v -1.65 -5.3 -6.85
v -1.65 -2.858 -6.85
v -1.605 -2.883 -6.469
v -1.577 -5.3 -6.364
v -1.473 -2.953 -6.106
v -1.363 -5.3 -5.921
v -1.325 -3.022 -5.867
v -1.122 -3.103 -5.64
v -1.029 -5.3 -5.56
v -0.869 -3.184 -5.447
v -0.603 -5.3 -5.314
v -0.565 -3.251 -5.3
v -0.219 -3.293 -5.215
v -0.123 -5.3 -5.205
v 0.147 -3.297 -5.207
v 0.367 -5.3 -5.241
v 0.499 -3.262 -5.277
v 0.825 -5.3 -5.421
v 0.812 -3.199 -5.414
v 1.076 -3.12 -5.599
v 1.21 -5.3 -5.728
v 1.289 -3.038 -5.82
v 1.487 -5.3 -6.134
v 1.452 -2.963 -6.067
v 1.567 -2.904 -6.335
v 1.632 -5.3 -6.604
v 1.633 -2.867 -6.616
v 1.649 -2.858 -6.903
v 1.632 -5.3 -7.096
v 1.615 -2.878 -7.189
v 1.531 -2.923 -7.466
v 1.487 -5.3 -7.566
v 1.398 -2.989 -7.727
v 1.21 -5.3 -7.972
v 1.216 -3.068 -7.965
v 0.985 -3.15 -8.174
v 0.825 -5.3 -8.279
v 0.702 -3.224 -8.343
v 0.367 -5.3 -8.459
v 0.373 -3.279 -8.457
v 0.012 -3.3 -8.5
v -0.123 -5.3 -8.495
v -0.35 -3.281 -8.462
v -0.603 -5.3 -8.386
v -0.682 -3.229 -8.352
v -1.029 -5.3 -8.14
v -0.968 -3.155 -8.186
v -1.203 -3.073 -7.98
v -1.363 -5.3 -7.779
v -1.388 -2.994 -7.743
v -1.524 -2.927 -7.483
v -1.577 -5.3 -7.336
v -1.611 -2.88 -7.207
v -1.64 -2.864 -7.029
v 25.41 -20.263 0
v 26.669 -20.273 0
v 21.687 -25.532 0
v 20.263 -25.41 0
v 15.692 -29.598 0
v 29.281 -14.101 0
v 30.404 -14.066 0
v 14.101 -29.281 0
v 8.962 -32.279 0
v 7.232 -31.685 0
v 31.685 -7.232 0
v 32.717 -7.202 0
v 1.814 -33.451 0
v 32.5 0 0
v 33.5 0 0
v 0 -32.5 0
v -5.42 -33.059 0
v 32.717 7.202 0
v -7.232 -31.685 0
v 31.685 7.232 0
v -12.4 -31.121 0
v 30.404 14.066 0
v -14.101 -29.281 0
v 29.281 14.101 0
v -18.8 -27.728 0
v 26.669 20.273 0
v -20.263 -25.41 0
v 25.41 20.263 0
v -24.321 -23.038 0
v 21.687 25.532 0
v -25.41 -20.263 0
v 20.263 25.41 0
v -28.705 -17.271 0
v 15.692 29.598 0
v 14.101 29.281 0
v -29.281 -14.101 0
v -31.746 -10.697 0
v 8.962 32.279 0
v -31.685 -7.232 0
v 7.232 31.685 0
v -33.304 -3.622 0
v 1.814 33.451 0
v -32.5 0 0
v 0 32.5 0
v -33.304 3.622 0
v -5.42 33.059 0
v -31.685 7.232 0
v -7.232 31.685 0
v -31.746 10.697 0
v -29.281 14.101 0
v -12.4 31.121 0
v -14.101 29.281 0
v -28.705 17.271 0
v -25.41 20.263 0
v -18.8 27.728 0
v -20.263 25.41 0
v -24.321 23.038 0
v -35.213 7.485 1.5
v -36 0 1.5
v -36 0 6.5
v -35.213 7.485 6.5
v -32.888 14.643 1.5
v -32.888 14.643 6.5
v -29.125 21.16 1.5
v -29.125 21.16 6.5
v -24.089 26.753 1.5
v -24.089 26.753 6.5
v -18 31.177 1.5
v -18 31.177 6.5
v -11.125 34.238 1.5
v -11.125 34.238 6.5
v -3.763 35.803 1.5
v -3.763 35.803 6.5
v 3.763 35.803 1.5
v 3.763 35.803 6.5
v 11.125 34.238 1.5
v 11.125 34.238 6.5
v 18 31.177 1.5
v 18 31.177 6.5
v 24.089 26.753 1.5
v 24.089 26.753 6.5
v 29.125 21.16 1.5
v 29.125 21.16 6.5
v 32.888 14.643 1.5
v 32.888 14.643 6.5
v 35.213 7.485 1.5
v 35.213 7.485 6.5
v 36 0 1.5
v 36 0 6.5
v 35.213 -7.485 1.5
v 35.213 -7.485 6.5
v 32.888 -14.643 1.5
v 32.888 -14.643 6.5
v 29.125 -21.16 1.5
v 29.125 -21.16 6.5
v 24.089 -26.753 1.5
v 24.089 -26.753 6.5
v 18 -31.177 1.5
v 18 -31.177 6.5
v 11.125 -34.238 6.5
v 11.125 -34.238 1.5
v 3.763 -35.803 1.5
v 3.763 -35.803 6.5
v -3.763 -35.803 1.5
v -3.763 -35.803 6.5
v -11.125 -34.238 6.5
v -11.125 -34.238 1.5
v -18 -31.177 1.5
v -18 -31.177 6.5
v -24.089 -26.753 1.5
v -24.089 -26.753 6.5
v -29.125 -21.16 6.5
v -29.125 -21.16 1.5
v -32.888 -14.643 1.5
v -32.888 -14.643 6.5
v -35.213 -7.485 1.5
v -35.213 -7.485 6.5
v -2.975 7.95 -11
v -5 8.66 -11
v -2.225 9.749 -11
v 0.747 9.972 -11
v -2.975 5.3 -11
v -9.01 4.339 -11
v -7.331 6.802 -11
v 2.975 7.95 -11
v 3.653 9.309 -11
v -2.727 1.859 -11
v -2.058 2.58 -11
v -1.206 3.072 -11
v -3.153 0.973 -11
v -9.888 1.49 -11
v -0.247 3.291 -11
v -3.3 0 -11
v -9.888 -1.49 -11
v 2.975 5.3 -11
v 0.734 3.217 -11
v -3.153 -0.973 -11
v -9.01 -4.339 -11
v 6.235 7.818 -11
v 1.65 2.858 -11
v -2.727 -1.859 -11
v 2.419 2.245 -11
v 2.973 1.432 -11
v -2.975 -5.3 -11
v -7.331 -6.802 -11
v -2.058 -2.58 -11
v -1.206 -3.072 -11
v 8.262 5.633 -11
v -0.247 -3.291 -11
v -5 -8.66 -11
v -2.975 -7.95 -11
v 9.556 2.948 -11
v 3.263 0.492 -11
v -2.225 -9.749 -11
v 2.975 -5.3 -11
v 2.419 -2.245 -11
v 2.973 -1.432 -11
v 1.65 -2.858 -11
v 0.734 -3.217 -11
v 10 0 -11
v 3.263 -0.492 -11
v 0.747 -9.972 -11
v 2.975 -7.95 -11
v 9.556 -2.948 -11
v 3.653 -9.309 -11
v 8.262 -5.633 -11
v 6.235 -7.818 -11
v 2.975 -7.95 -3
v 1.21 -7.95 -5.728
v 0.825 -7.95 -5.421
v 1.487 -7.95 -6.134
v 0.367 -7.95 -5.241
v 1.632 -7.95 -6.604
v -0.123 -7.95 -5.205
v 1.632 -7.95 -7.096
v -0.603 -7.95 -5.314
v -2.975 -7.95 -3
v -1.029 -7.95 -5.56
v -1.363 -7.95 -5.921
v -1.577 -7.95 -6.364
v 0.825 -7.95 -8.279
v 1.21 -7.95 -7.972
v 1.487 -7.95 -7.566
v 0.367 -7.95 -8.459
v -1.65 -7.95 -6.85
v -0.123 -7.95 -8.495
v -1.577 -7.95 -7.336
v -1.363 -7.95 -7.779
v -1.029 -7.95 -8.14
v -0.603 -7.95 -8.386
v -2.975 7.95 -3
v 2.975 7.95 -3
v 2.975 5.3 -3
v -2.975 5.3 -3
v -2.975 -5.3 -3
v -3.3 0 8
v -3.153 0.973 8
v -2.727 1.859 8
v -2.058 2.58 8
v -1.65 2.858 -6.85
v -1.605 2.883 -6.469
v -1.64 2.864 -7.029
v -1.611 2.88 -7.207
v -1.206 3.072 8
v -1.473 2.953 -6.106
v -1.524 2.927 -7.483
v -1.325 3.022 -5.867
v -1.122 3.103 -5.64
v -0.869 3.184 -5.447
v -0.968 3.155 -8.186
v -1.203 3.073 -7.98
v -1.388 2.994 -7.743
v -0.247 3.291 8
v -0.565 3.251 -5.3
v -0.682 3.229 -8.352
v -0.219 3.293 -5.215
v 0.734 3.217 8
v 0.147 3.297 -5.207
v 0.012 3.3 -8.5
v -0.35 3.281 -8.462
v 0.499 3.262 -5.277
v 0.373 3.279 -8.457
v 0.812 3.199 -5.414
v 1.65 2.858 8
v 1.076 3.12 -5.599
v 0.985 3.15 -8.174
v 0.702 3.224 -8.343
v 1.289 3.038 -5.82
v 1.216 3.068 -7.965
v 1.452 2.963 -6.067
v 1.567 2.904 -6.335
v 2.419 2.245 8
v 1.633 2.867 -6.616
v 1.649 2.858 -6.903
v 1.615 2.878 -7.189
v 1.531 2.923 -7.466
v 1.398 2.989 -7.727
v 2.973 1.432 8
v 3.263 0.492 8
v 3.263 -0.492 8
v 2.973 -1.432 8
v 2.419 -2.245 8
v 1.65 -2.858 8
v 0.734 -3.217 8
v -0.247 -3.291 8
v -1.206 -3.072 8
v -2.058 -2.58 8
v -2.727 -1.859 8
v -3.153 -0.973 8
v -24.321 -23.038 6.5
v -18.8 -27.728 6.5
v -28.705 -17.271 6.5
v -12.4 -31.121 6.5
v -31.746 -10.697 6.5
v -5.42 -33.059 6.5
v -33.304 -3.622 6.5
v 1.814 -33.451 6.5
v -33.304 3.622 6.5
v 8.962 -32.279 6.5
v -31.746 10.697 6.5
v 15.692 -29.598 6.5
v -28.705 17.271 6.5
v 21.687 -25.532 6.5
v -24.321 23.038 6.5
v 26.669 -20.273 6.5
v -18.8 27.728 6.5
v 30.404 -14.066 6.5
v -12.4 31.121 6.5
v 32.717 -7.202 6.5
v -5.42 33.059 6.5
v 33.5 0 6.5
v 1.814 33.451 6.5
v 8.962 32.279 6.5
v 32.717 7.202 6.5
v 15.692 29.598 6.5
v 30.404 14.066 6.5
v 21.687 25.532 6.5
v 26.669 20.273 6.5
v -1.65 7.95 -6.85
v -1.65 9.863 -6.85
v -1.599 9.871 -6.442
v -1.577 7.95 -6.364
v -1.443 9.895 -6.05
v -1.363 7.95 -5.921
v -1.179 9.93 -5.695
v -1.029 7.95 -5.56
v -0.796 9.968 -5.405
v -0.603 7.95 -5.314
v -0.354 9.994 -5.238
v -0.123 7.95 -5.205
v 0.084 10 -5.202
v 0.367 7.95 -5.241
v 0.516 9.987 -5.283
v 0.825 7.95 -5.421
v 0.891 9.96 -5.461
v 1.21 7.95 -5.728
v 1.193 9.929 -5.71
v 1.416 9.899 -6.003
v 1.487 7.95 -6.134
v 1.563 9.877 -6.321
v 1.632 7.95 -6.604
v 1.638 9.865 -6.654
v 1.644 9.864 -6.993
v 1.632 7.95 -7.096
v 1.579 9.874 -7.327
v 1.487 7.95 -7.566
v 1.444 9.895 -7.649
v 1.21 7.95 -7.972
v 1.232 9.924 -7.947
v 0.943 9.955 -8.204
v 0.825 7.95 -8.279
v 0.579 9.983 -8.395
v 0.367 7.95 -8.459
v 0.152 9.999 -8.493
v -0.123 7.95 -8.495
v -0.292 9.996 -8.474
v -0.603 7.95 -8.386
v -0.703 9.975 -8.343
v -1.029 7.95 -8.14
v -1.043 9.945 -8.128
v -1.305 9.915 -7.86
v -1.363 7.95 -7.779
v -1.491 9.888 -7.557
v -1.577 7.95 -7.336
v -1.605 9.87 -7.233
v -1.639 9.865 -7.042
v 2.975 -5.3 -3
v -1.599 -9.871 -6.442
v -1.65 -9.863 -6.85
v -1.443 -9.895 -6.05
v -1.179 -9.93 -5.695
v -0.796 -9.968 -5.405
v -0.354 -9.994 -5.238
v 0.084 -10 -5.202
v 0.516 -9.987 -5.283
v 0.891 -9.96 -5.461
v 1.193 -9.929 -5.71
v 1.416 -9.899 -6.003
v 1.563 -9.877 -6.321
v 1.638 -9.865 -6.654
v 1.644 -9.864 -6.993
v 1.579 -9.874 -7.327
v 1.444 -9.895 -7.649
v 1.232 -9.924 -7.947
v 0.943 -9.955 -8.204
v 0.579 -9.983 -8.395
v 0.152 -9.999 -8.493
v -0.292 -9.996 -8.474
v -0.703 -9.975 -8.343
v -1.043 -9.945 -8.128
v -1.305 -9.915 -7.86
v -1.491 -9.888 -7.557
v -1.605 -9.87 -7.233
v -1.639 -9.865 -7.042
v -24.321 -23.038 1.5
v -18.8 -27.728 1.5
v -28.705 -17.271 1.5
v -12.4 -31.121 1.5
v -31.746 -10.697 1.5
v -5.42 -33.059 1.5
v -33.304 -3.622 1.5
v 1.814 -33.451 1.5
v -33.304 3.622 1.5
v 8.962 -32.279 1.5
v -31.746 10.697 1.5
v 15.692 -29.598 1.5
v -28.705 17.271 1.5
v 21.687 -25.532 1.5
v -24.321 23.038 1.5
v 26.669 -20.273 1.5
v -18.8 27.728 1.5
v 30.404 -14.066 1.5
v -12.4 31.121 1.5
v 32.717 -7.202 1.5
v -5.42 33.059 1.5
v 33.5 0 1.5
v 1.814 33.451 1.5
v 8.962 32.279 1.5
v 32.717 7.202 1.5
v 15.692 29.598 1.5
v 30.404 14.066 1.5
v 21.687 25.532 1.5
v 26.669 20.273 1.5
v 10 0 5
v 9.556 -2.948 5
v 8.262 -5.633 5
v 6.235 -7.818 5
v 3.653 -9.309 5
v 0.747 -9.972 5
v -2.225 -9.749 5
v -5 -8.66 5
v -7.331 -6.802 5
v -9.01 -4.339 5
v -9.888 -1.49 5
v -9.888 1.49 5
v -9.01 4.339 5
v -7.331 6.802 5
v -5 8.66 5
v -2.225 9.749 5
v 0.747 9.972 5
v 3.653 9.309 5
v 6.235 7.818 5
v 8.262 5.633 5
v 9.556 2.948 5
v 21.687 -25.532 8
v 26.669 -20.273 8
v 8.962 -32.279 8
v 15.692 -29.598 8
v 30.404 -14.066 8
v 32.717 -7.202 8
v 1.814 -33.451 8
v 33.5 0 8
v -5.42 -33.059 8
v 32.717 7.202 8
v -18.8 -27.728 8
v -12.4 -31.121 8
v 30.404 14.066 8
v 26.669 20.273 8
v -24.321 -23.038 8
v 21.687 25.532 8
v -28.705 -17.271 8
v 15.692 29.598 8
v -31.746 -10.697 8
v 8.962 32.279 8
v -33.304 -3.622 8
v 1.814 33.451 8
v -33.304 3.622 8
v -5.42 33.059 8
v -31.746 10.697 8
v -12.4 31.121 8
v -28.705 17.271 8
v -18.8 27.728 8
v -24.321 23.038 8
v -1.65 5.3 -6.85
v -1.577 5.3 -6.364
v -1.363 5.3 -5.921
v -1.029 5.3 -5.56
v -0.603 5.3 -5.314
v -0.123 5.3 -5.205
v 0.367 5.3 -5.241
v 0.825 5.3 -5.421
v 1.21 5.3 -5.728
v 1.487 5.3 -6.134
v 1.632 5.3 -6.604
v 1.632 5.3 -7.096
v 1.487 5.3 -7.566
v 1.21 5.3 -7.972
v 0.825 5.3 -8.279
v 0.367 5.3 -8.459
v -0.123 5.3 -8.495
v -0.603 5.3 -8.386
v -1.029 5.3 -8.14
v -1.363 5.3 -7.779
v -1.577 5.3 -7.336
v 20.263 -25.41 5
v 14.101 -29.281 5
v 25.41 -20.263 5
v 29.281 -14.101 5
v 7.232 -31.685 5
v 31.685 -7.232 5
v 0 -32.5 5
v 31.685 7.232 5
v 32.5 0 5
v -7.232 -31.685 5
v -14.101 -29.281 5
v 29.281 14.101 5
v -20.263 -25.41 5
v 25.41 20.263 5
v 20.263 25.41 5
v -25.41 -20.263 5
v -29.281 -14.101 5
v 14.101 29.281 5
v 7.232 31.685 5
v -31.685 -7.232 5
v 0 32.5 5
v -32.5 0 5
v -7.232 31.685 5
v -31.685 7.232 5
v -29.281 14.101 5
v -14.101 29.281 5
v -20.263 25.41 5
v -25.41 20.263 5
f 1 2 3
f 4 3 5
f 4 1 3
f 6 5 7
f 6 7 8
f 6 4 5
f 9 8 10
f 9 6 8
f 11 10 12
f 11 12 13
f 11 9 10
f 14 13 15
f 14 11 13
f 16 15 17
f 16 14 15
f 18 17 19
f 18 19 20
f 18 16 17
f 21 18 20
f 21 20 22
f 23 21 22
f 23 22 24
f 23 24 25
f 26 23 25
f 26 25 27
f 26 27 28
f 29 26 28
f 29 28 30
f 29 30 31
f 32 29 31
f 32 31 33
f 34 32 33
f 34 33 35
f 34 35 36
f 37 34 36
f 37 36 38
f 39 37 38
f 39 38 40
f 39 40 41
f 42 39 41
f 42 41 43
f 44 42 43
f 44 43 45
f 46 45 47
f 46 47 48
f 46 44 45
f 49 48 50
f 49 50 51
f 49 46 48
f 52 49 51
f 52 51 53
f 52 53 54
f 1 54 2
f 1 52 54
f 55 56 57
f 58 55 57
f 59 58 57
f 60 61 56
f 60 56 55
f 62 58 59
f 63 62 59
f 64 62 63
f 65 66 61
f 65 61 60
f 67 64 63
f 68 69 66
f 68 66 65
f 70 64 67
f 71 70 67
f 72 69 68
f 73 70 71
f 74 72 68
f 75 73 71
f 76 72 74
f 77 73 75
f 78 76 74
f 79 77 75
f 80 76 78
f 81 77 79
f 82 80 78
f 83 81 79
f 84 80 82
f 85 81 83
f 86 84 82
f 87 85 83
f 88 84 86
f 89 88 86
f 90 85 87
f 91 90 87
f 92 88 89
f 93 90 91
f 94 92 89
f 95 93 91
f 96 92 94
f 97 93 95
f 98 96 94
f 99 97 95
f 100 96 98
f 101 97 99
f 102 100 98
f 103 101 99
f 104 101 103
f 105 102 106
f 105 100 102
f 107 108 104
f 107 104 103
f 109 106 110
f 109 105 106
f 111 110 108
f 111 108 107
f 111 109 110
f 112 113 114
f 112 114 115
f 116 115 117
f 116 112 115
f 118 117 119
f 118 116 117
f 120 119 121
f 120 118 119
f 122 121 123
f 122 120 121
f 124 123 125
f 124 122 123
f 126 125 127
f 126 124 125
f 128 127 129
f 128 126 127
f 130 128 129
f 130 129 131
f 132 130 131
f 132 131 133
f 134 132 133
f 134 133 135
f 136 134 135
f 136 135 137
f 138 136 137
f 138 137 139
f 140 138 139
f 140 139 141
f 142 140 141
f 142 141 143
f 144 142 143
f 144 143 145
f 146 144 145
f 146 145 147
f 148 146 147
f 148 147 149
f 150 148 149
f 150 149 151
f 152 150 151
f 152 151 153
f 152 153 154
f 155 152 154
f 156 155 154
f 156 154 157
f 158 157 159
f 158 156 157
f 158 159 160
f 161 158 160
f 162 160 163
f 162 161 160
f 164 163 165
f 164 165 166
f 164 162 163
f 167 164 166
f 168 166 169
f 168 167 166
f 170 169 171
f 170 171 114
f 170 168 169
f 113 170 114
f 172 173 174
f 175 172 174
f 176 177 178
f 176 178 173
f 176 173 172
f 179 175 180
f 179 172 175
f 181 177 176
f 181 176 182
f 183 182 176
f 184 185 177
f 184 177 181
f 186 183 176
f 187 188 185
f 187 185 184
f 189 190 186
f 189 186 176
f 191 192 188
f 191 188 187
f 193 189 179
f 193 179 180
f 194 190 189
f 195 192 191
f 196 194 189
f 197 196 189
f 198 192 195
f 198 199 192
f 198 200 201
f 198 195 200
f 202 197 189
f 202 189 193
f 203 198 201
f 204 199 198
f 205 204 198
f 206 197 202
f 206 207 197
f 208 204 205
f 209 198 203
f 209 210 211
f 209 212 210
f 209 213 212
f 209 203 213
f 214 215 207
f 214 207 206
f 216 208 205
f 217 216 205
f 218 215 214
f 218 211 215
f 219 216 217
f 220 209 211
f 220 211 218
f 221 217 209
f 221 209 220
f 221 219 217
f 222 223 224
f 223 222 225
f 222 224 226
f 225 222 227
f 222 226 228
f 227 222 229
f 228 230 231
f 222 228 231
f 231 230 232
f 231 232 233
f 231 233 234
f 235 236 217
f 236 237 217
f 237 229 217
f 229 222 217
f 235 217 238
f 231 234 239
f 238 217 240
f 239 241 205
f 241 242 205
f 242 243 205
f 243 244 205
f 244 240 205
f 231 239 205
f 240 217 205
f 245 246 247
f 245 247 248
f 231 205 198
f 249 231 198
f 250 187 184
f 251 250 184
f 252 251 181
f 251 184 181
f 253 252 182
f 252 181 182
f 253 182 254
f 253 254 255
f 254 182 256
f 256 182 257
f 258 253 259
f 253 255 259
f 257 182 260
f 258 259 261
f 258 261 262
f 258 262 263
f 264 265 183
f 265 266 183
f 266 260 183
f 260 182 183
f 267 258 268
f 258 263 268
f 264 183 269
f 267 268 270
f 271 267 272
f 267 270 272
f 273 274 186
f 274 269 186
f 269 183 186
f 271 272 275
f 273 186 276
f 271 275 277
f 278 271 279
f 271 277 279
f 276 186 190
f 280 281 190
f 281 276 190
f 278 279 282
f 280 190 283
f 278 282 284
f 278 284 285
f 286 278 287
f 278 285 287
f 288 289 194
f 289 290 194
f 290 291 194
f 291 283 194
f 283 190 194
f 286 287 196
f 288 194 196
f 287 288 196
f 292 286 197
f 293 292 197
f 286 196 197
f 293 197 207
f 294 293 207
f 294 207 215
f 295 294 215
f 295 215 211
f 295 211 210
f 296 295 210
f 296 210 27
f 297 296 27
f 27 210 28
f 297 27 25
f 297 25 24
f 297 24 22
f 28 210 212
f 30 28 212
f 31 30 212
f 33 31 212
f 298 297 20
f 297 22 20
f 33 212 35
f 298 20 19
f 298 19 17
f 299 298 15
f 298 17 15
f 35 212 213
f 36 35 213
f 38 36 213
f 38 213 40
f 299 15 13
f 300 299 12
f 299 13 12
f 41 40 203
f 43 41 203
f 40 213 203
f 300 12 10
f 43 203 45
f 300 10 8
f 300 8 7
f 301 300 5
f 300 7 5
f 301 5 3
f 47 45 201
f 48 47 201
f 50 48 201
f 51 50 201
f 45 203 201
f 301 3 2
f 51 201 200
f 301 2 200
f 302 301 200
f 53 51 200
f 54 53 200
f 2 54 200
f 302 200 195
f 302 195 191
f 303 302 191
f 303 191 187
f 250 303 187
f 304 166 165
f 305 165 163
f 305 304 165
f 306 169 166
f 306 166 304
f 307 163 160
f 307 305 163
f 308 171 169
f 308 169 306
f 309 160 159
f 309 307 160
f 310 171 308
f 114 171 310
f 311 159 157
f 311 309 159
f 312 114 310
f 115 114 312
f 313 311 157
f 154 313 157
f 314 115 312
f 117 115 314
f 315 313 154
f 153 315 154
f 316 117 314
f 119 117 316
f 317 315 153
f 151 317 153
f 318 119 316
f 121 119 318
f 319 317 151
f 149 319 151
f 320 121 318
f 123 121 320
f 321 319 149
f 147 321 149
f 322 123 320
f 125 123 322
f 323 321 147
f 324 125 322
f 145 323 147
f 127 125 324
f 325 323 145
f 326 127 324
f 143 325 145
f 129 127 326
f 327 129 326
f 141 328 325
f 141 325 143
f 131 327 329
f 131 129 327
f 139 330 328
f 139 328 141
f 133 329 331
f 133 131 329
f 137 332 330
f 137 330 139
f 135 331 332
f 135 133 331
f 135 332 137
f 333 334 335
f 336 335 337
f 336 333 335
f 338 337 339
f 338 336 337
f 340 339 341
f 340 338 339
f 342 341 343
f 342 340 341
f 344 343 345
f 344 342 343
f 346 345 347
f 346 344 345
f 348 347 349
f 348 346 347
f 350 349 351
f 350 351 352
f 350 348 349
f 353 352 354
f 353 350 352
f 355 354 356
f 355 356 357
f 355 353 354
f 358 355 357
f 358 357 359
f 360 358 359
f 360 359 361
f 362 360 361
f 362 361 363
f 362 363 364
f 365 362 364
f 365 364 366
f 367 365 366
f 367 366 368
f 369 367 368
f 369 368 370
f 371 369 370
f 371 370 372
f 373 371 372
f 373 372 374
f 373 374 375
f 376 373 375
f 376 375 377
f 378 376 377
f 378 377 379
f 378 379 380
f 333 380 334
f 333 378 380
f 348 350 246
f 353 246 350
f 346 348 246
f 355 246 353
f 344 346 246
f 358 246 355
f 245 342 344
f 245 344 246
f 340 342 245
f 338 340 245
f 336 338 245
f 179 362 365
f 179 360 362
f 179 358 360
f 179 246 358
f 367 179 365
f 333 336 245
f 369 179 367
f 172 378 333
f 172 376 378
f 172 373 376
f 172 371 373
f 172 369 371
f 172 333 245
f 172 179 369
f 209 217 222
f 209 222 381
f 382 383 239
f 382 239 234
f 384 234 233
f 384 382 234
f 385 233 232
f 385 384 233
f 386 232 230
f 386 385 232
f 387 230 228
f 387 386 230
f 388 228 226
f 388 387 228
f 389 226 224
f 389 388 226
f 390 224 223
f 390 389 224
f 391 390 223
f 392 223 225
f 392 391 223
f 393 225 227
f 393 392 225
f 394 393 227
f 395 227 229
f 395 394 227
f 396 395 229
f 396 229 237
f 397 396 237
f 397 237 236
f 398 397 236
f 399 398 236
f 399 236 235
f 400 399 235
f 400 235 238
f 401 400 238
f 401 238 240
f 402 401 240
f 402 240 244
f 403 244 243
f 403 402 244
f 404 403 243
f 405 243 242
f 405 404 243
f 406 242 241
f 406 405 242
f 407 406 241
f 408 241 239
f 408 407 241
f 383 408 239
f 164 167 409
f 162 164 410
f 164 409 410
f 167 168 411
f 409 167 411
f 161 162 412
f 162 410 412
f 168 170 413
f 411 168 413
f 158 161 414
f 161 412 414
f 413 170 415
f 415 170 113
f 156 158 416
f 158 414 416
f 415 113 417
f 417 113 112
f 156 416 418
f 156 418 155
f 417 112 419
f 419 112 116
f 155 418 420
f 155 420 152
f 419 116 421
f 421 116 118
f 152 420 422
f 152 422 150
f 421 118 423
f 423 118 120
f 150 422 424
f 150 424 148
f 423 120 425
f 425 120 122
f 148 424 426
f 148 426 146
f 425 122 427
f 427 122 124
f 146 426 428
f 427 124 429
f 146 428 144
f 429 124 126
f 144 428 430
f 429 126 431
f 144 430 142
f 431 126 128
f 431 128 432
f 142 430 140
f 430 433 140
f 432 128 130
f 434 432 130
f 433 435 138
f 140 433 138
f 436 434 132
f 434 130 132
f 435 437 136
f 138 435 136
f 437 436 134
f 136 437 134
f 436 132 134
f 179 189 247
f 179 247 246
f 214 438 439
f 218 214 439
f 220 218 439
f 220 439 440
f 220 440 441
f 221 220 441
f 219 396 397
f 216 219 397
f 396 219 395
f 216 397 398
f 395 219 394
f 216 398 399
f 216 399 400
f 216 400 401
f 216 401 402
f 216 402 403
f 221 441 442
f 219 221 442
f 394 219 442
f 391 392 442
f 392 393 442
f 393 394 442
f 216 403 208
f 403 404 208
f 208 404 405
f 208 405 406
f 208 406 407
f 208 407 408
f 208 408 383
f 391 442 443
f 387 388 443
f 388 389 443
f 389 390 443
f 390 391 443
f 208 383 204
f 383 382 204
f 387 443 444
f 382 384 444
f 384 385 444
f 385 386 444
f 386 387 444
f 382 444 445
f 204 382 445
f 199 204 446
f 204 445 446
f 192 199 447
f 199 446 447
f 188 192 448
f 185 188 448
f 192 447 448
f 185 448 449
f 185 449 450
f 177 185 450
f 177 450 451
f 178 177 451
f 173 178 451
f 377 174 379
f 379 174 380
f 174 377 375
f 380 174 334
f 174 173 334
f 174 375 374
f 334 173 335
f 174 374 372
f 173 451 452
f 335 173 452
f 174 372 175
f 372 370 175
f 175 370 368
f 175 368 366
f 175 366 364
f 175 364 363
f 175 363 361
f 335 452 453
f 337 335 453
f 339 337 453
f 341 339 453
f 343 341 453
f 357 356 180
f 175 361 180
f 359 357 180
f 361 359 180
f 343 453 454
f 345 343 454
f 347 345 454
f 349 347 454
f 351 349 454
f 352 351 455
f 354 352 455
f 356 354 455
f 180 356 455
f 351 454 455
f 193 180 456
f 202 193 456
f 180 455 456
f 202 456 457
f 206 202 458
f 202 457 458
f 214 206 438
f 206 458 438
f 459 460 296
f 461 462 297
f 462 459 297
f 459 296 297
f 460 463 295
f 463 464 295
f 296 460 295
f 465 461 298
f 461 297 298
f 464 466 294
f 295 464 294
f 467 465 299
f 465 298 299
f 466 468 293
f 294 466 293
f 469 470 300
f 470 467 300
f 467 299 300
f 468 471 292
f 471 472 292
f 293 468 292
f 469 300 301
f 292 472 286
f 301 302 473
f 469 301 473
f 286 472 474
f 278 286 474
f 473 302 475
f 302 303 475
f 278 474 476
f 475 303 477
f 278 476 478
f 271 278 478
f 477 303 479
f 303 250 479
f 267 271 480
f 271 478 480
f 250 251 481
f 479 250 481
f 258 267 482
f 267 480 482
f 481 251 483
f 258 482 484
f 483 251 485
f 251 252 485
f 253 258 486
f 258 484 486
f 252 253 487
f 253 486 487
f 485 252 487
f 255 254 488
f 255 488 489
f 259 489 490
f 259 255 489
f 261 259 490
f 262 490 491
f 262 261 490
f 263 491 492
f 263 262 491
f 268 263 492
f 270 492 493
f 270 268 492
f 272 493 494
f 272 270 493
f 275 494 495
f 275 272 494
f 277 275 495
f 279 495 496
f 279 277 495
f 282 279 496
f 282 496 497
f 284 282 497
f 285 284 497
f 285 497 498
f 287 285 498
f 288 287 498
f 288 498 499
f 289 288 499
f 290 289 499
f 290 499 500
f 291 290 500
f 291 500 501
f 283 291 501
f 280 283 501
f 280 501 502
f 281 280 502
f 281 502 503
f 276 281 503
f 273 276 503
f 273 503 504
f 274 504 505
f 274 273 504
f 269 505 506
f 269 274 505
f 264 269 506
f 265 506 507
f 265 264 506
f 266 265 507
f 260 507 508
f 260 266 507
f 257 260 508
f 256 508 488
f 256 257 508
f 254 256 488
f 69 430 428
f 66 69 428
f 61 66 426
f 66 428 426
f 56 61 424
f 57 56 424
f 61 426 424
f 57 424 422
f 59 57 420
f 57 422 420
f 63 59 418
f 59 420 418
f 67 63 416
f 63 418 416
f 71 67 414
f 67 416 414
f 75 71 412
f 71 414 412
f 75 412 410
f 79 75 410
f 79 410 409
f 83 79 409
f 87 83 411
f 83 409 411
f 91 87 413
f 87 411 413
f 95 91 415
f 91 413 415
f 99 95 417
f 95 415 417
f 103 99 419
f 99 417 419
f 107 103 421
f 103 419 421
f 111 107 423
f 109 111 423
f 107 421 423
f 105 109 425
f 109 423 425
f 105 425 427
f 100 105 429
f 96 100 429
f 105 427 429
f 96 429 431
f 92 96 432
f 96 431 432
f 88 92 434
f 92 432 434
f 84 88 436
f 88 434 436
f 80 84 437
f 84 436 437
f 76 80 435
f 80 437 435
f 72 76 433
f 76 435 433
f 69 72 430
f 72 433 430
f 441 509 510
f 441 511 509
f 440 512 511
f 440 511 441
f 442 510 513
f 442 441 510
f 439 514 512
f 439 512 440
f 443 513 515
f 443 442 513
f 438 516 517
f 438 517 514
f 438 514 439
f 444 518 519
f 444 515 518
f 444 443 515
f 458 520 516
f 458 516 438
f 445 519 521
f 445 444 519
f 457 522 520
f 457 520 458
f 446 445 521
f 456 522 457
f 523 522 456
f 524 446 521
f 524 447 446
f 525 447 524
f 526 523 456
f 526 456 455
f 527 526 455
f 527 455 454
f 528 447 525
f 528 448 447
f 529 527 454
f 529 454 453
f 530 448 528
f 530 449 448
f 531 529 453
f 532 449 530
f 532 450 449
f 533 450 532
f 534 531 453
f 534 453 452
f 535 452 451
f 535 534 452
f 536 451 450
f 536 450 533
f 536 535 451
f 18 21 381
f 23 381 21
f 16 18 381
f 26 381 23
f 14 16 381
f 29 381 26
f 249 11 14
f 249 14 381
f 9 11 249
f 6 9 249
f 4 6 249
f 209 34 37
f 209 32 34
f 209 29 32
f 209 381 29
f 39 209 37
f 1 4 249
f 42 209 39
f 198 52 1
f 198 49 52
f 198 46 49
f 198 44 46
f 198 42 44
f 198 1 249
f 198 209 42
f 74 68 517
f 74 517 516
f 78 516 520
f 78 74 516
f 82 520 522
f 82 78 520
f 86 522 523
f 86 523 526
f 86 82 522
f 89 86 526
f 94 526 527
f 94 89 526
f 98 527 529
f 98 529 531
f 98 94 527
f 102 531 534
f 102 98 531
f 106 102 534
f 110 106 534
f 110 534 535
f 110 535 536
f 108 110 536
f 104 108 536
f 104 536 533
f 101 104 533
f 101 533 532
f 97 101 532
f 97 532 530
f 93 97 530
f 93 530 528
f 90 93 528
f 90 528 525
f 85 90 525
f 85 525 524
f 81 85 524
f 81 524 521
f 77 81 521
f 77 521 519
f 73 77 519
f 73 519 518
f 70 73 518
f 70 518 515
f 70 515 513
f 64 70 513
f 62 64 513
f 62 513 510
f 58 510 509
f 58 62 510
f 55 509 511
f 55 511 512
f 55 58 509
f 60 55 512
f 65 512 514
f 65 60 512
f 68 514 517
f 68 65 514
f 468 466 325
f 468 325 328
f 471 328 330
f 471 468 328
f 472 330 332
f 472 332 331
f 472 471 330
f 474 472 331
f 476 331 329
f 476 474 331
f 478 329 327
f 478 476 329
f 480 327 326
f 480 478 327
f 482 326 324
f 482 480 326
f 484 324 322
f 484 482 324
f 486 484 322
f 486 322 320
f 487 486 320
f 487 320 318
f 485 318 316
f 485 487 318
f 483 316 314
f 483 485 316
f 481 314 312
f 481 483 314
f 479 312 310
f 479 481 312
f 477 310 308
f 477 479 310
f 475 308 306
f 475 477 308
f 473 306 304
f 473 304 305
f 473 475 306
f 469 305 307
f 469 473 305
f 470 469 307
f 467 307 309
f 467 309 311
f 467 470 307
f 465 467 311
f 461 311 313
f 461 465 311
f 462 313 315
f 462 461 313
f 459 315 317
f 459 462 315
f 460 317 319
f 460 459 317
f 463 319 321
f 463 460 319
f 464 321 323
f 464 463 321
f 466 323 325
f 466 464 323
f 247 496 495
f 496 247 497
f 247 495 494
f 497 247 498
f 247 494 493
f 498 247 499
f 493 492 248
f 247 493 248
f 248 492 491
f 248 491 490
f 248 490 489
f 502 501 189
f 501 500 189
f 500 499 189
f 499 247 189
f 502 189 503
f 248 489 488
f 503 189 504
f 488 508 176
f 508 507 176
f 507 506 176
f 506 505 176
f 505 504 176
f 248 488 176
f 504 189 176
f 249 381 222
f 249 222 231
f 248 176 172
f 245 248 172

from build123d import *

# Parameters (mm, degrees)
ESBO_O1_R                     = 35
ESBO_O1_R_2                   = 32.5
RESSALTO_EXTRUS_O1_DEPTH      = 8
RESSALTO_EXTRUS_O2_START      = -3
ESBO_O2_R                     = 32.5
RESSALTO_EXTRUS_O2_DEPTH      = 3
ESBO_O3_R                     = 2.5
CORTE_EXTRUS_O1_DEPTH         = 3
RESSALTO_EXTRUS_O3_DEPTH      = 5
RESSALTO_EXTRUS_O3_DEPTH_BACK = 3
ESBO_O4_R                     = 37
ESBO_O4_R_2                   = 35
ESBO_O5_W                     = 1.8
ESBO_O5_H                     = 3
ESBO_O6_R                     = 12.55
RESSALTO_EXTRUS_O4_DEPTH      = 5
CORTE_EXTRUS_O2_DEPTH         = 53.933921071
CORTE_EXTRUS_O2_DEPTH_BACK    = 53.933921071
ESBO_O7_R                     = 7.55
RESSALTO_EXTRUS_O5_START      = -8
ESBO_O8_R                     = 37
ESBO_O8_R_2                   = 32.5
RESSALTO_EXTRUS_O5_DEPTH      = 8
ESBO_O9_R                     = 37
ESBO_O9_R_2                   = 33.5
CORTE_EXTRUS_O8_DEPTH         = 1.5
CORTE_EXTRUS_O9_START         = -1.5
ESBO_O12_R                    = 37
ESBO_O12_R_2                  = 33.5
CORTE_EXTRUS_O9_DEPTH         = 1.5
CORTE_EXTRUS_O10_START        = -10
ESBO_O13_R                    = 37
ESBO_O13_R_2                  = 36
CORTE_EXTRUS_O10_DEPTH        = 10
ESBO_O14_R                    = 37
ESBO_O14_R_2                  = 36
RESSALTO_EXTRUS_O6_DEPTH      = 5
ESBO_O15_R                    = 12.55
CORTE_EXTRUS_O11_DEPTH        = 53.933921071
ESBO_O16_R                    = 12.55
RESSALTO_EXTRUS_O7_DEPTH      = 3
ESBO_O17_R                    = 10
RESSALTO_EXTRUS_O8_DEPTH      = 16
ESBO_O18_R                    = 3.3
CORTE_EXTRUS_O12_DEPTH        = 16
ESBO_O19_W                    = 5.95
ESBO_O19_H                    = 2.65
CORTE_EXTRUS_O13_DEPTH        = 8
CORTE_EXTRUS_O14_DEPTH        = 58.265085349
CORTE_EXTRUS_O14_DEPTH_BACK   = 58.265085349
ESBO_O21_R                    = 1.65
ESBO_O23_R                    = 37
ESBO_O23_R_2                  = 36
CORTE_EXTRUS_O15_DEPTH        = 54.798234195
ESBO_O24_R                    = 3.3
CORTE_EXTRUS_O16_DEPTH        = 55.341512677


with BuildPart() as part:
    # Esboço1 → Ressalto-extrusão1 (new body)
    with BuildSketch(Plane.XY):
        Circle(ESBO_O1_R)
        Circle(ESBO_O1_R_2, mode=Mode.SUBTRACT)
    extrude(amount=RESSALTO_EXTRUS_O1_DEPTH)

    # Esboço2 → Ressalto-extrusão2 (add)
    with BuildSketch(Plane.XY.offset(8).offset(RESSALTO_EXTRUS_O2_START)):
        Circle(ESBO_O2_R)
    extrude(amount=RESSALTO_EXTRUS_O2_DEPTH)

    # Esboço3 → Corte-extrusão1 (cut)
    with BuildSketch(Plane.XY.offset(8)):
        Circle(ESBO_O3_R)
    extrude(amount=-CORTE_EXTRUS_O1_DEPTH, mode=Mode.SUBTRACT)

    # Esboço4 → Ressalto-extrusão3 (add, two sides: drawn at the far end of the back side and taken through both)
    with BuildSketch(Plane(origin=(0, 0, 5), x_dir=(-1, 0, 0), z_dir=(0, 0, -1)).offset(-RESSALTO_EXTRUS_O3_DEPTH_BACK)):
        Circle(ESBO_O4_R)
        Circle(ESBO_O4_R_2, mode=Mode.SUBTRACT)
    extrude(amount=RESSALTO_EXTRUS_O3_DEPTH + RESSALTO_EXTRUS_O3_DEPTH_BACK)

    # Esboço5 → Corte-Revolução1 (revolve, cut)
    with BuildSketch(Plane(origin=(0, 0, 0), x_dir=(1, 0, 0), z_dir=(0, 1, 0))):
        with Locations((-36.1, -2.5)):
            Rectangle(ESBO_O5_W, ESBO_O5_H)
        with Locations((-36.1, -5.5)):
            Rectangle(ESBO_O5_W, ESBO_O5_H)
    revolve(axis=Axis((0, 0, 8), (0, 0, -1)), mode=Mode.SUBTRACT)

    # Esboço6 → Ressalto-extrusão4 (add)
    with BuildSketch(Plane(origin=(0, 0, 5), x_dir=(-1, 0, 0), z_dir=(0, 0, -1))):
        with Locations(Location((0, 0, 0), (0, 0, 180))):
            Circle(ESBO_O6_R)
    extrude(amount=RESSALTO_EXTRUS_O4_DEPTH)

    # Esboço7 → Corte-extrusão2 (cut, two sides: drawn at the far end of the back side and taken through both)
    with BuildSketch(Plane(origin=(0, 0, 0), x_dir=(-1, 0, 0), z_dir=(0, 0, -1)).offset(-CORTE_EXTRUS_O2_DEPTH_BACK)):
        Circle(ESBO_O7_R)
    extrude(amount=CORTE_EXTRUS_O2_DEPTH + CORTE_EXTRUS_O2_DEPTH_BACK, mode=Mode.SUBTRACT)

    # Esboço8 → Ressalto-extrusão5 (add)
    with BuildSketch(Plane.XY.offset(8).offset(RESSALTO_EXTRUS_O5_START)):
        with Locations(Location((0, 0, 0), (0, 0, 180))):
            Circle(ESBO_O8_R)
        Circle(ESBO_O8_R_2, mode=Mode.SUBTRACT)
    extrude(amount=RESSALTO_EXTRUS_O5_DEPTH)

    # Esboço9 → Corte-extrusão8 (cut)
    with BuildSketch(Plane.XY.offset(8)):
        with Locations(Location((0, 0, 0), (0, 0, 180))):
            Circle(ESBO_O9_R)
        Circle(ESBO_O9_R_2, mode=Mode.SUBTRACT)
    extrude(amount=-CORTE_EXTRUS_O8_DEPTH, mode=Mode.SUBTRACT)

    # Esboço12 → Corte-extrusão9 (cut)
    with BuildSketch(Plane(origin=(0, 0, 0), x_dir=(-1, 0, 0), z_dir=(0, 0, -1)).offset(CORTE_EXTRUS_O9_START)):
        Circle(ESBO_O12_R)
        with Locations(Location((0, 0, 0), (0, 0, 180))):
            Circle(ESBO_O12_R_2, mode=Mode.SUBTRACT)
    extrude(amount=CORTE_EXTRUS_O9_DEPTH, mode=Mode.SUBTRACT)

    # Esboço13 → Corte-extrusão10 (cut)
    with BuildSketch(Plane(origin=(0, 0, 1.5), x_dir=(-1, 0, 0), z_dir=(0, 0, -1)).offset(CORTE_EXTRUS_O10_START)):
        Circle(ESBO_O13_R)
        Circle(ESBO_O13_R_2, mode=Mode.SUBTRACT)
    extrude(amount=CORTE_EXTRUS_O10_DEPTH, mode=Mode.SUBTRACT)

    # Esboço14 → Ressalto-extrusão6 (add)
    with BuildSketch(Plane.XY.offset(6.5)):
        Circle(ESBO_O14_R)
        Circle(ESBO_O14_R_2, mode=Mode.SUBTRACT)
    extrude(amount=-RESSALTO_EXTRUS_O6_DEPTH)

    # Esboço15 → Corte-extrusão11 (cut, through all)
    with BuildSketch(Plane(origin=(0, 0, 0), x_dir=(-1, 0, 0), z_dir=(0, 0, -1))):
        Circle(ESBO_O15_R)
    extrude(amount=-CORTE_EXTRUS_O11_DEPTH, mode=Mode.SUBTRACT)

    # Esboço16 → Ressalto-extrusão7 (add, through all)
    with BuildSketch(Plane(origin=(0, 0, 5), x_dir=(-1, 0, 0), z_dir=(0, 0, -1))):
        Circle(ESBO_O16_R)
    extrude(amount=-RESSALTO_EXTRUS_O7_DEPTH)

    # Esboço17 → Ressalto-extrusão8 (add)
    with BuildSketch(Plane(origin=(0, 0, 5), x_dir=(-1, 0, 0), z_dir=(0, 0, -1))):
        with Locations(Location((0, 0, 0), (0, 0, 180))):
            Circle(ESBO_O17_R)
    extrude(amount=RESSALTO_EXTRUS_O8_DEPTH)

    # Esboço18 → Corte-extrusão12 (cut)
    with BuildSketch(Plane(origin=(0, 0, -11), x_dir=(-1, 0, 0), z_dir=(0, 0, -1))):
        Circle(ESBO_O18_R)
    extrude(amount=-CORTE_EXTRUS_O12_DEPTH, mode=Mode.SUBTRACT)

    # Esboço19 → Corte-extrusão13 (cut)
    with BuildSketch(Plane(origin=(0, 0, -11), x_dir=(-1, 0, 0), z_dir=(0, 0, -1))):
        with Locations((0, -6.625)):
            Rectangle(ESBO_O19_W, ESBO_O19_H)
        with Locations((0, 6.625)):
            Rectangle(ESBO_O19_W, ESBO_O19_H)
    extrude(amount=-CORTE_EXTRUS_O13_DEPTH, mode=Mode.SUBTRACT)

    # Esboço21 → Corte-extrusão14 (cut, two sides: drawn at the far end of the back side and taken through both)
    with BuildSketch(Plane(origin=(0, 5.3, 0), x_dir=(1, 0, 0), z_dir=(0, 1, 0)).offset(-CORTE_EXTRUS_O14_DEPTH_BACK)):
        with Locations(Location((0, 6.85, 0), (0, 0, 180))):
            Circle(ESBO_O21_R)
    extrude(amount=CORTE_EXTRUS_O14_DEPTH + CORTE_EXTRUS_O14_DEPTH_BACK, mode=Mode.SUBTRACT)

    # Esboço23 → Corte-extrusão15 (cut, through all)
    with BuildSketch(Plane(origin=(0, 0, 1.5), x_dir=(-1, 0, 0), z_dir=(0, 0, -1))):
        Circle(ESBO_O23_R)
        Circle(ESBO_O23_R_2, mode=Mode.SUBTRACT)
    extrude(amount=-CORTE_EXTRUS_O15_DEPTH, mode=Mode.SUBTRACT)

    # Esboço24 → Corte-extrusão16 (cut, through all)
    with BuildSketch(Plane(origin=(0, 0, -11), x_dir=(-1, 0, 0), z_dir=(0, 0, -1))):
        Circle(ESBO_O24_R)
    extrude(amount=-CORTE_EXTRUS_O16_DEPTH, mode=Mode.SUBTRACT)


solid = part.part
